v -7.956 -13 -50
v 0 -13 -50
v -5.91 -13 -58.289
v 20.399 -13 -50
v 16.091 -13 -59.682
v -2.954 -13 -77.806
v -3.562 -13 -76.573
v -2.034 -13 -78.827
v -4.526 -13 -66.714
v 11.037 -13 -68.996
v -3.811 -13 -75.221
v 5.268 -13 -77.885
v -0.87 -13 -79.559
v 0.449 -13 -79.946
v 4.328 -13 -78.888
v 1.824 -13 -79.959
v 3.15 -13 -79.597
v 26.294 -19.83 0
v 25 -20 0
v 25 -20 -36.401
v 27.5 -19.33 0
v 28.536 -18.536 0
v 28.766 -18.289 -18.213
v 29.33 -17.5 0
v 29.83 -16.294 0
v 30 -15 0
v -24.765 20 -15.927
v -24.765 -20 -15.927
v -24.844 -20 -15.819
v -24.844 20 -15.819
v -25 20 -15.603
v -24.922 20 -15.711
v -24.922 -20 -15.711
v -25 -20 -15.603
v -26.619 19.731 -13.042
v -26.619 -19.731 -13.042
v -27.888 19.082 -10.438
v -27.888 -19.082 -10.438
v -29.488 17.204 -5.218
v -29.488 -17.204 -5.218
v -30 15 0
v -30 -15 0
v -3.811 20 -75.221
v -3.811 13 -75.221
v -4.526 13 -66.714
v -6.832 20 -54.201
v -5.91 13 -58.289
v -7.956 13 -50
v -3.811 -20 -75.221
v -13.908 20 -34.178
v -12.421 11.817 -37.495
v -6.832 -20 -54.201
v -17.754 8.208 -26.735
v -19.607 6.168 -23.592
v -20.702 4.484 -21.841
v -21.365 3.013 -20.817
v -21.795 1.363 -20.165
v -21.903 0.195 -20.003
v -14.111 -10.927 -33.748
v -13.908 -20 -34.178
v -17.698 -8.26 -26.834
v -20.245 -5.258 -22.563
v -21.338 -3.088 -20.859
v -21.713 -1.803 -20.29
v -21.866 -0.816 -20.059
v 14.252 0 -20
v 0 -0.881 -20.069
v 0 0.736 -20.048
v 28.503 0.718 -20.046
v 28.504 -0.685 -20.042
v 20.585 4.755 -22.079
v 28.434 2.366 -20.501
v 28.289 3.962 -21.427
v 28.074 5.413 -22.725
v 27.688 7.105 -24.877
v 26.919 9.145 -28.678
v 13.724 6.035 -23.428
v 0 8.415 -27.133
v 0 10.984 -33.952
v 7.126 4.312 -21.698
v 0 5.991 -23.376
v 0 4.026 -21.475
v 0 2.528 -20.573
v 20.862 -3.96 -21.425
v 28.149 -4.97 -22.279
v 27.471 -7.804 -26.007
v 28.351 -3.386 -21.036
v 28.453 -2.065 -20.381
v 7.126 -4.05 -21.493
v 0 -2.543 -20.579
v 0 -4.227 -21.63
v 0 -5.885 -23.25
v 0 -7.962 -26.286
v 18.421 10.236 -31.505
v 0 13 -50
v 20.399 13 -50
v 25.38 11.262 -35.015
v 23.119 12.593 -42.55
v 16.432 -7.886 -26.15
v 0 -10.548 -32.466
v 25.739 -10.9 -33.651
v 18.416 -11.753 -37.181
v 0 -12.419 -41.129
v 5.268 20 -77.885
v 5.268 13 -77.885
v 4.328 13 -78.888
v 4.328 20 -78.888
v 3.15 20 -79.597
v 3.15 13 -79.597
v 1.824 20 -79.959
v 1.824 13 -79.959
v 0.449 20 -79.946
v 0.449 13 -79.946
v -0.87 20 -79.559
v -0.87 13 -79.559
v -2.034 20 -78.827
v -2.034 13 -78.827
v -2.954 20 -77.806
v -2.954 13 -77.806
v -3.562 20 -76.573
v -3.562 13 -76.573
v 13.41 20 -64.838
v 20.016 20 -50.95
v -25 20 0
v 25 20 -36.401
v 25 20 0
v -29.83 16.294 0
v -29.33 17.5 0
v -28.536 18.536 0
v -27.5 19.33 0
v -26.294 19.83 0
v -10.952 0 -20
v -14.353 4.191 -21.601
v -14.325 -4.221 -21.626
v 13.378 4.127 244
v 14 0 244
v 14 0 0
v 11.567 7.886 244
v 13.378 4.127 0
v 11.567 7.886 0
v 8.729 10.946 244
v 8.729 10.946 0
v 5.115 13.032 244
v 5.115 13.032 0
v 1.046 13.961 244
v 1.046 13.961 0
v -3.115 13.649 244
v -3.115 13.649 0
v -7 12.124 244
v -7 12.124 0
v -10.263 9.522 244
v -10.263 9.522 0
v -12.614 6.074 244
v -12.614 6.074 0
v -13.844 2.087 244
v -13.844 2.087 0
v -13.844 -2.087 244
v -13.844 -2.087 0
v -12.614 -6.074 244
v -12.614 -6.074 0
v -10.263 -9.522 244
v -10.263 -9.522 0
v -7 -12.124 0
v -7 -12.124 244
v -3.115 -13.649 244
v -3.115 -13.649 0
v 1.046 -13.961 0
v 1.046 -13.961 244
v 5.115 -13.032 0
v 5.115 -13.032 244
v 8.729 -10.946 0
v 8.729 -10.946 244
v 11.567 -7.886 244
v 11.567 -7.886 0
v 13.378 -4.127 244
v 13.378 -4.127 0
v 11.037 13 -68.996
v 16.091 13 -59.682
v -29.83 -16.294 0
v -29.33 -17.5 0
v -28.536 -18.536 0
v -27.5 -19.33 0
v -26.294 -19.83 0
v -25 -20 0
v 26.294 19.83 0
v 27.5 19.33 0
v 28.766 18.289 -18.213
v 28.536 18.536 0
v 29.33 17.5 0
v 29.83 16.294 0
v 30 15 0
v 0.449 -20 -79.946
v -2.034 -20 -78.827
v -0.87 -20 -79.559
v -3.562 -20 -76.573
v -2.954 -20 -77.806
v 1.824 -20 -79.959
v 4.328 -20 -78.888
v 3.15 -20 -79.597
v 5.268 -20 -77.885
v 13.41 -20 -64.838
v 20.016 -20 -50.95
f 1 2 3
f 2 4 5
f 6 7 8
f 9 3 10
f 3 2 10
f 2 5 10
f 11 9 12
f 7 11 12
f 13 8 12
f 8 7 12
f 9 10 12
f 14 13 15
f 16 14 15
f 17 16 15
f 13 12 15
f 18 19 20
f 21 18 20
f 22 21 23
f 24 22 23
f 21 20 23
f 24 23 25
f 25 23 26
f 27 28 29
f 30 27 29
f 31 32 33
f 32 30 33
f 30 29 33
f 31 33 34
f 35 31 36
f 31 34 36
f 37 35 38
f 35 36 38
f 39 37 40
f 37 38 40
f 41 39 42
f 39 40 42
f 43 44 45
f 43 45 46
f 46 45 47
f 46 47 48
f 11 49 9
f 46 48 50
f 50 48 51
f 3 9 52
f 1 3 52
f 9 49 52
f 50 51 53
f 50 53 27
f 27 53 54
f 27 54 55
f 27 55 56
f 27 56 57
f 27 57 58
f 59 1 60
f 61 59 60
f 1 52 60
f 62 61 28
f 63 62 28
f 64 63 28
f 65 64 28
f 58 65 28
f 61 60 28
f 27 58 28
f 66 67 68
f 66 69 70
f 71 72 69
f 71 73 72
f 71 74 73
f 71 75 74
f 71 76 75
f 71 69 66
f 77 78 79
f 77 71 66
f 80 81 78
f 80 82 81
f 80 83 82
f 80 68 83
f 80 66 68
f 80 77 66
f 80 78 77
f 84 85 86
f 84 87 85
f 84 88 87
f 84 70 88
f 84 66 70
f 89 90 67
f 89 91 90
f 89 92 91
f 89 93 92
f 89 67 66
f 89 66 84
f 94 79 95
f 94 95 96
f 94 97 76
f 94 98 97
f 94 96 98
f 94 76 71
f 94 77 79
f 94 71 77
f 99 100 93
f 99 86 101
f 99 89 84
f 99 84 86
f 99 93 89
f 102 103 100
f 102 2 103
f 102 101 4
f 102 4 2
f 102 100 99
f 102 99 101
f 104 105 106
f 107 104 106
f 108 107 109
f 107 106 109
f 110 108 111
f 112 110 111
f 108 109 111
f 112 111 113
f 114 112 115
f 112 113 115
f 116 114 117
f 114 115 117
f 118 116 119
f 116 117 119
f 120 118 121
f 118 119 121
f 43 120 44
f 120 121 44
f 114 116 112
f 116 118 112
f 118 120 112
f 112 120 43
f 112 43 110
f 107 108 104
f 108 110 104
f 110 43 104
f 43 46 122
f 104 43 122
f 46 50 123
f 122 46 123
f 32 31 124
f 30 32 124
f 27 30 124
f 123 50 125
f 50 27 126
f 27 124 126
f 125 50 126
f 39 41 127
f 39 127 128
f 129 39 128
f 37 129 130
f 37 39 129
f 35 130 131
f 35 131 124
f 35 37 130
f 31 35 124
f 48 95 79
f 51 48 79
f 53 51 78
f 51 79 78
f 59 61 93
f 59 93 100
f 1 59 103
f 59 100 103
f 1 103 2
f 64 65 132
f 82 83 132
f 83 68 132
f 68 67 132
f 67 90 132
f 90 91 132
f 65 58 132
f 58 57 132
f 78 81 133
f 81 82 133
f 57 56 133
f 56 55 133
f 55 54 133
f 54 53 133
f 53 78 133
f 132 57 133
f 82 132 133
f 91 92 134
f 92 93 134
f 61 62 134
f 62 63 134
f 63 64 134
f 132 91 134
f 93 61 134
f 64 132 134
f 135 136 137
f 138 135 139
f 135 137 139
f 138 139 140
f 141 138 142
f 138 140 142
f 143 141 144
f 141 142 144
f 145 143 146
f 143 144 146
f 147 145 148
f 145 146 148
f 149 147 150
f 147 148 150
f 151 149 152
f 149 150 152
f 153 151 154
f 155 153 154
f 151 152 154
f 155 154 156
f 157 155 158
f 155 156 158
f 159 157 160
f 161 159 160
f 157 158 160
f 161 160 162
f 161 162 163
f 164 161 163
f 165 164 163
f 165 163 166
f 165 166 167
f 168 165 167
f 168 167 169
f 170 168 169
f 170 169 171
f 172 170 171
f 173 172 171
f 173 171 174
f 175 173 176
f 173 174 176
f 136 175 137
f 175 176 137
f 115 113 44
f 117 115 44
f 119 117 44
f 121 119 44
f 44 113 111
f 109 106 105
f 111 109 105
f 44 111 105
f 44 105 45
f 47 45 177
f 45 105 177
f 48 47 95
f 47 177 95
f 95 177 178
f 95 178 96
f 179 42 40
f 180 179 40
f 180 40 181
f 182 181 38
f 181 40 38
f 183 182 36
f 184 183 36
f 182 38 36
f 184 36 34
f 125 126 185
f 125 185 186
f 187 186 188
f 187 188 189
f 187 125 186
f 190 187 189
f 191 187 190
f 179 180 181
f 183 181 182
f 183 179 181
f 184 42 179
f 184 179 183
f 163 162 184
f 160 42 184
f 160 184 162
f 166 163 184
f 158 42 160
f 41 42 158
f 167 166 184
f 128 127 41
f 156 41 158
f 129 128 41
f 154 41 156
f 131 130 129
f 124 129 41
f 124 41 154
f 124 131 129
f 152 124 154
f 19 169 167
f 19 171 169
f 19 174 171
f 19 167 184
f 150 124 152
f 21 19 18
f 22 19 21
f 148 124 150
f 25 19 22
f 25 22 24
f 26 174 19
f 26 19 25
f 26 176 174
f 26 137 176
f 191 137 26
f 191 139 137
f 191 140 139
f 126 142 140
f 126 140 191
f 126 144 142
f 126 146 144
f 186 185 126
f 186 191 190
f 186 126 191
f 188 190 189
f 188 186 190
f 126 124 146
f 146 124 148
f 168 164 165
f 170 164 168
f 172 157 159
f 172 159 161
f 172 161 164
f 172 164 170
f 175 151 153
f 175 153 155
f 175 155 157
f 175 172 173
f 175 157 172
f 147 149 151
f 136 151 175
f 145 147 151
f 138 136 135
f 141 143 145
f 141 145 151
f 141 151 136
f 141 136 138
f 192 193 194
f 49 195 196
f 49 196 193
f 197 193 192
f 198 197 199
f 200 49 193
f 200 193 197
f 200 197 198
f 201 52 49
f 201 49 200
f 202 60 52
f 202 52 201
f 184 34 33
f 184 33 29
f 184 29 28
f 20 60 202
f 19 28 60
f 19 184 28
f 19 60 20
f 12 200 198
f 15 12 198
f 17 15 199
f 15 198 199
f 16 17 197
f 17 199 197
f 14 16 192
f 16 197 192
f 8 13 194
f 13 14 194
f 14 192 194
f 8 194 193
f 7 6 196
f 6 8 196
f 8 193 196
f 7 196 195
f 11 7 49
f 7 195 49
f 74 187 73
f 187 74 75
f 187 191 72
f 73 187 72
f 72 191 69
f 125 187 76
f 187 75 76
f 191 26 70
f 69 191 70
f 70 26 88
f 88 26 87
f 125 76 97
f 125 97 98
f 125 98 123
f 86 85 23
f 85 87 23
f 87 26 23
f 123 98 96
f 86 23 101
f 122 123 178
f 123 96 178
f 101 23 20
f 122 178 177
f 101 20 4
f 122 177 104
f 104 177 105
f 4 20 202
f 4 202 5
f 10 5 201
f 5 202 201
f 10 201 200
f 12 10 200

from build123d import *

# Parameters (mm, degrees)
F0_R     = 14
F1_DEPTH = 244
F2_W     = 60
F2_H     = 40
F3_DEPTH = 80
F4_R     = 5
F6_DEPTH = 40
F8_DEPTH = 35


with BuildPart() as f1:
    # F0 (on Top) → F1 (new body)
    with BuildSketch(Plane.XY):
        Circle(F0_R)
    extrude(amount=F1_DEPTH)

    # F2 (on Top) → F3 (join)
    with BuildSketch(Plane.XY):
        Rectangle(F2_W, F2_H)
    extrude(amount=-F3_DEPTH)

    # F4
    f4_edges = [f1.edges().sort_by_distance(p)[0] for p in [
        (30, -20, -40),
        (-30, -20, -40),
        (30, 20, -40),
        (-30, 20, -40),
    ]]
    fillet(f4_edges, radius=F4_R)

    # F5 (on Front) → F6 (cut, symmetric)
    with BuildSketch(Plane.XZ):
        with BuildLine():
            Line((-30, 0), (-30, -85))
            Line((-30, -85), (30, -85))
            Line((30, -85), (30, 0))
            ThreePointArc((30, 0), (23.6684739344, -40.85858313), (5.2677953275, -77.8846153846))
            ThreePointArc((5.2677953275, -77.8846153846), (-0.2236501523, -79.7978199094), (-3.8113000271, -75.2212389381))
            ThreePointArc((-3.8113000271, -75.2212389381), (-9.8768127885, -44.0150908016), (-24.7651593513, -15.9268145426))
            ThreePointArc((-24.7651593513, -15.9268145426), (-28.6577337776, -8.3825261421), (-30, 0))
        make_face()
    extrude(amount=F6_DEPTH, both=True, mode=Mode.SUBTRACT)

    # F7 (on Right) → F8 (cut, symmetric)
    with BuildSketch(Plane.YZ):
        with BuildLine():
            Line((13, -80), (13, -50))
            add(Edge.make_bspline(
                [(13, -50), (13, -20), (0, -20), (-13, -20), (-13, -50)],
                knots=[1.5707963268, 1.5707963268, 1.5707963268, 3.1415926536, 3.1415926536, 4.7123889804, 4.7123889804, 4.7123889804], degree=2, weights=[1, 0.7071067812, 1, 0.7071067812, 1]))
            Line((-13, -50), (-13, -80))
            Line((-13, -80), (13, -80))
        make_face()
    extrude(amount=F8_DEPTH, both=True, mode=Mode.SUBTRACT)


solid = f1.part
